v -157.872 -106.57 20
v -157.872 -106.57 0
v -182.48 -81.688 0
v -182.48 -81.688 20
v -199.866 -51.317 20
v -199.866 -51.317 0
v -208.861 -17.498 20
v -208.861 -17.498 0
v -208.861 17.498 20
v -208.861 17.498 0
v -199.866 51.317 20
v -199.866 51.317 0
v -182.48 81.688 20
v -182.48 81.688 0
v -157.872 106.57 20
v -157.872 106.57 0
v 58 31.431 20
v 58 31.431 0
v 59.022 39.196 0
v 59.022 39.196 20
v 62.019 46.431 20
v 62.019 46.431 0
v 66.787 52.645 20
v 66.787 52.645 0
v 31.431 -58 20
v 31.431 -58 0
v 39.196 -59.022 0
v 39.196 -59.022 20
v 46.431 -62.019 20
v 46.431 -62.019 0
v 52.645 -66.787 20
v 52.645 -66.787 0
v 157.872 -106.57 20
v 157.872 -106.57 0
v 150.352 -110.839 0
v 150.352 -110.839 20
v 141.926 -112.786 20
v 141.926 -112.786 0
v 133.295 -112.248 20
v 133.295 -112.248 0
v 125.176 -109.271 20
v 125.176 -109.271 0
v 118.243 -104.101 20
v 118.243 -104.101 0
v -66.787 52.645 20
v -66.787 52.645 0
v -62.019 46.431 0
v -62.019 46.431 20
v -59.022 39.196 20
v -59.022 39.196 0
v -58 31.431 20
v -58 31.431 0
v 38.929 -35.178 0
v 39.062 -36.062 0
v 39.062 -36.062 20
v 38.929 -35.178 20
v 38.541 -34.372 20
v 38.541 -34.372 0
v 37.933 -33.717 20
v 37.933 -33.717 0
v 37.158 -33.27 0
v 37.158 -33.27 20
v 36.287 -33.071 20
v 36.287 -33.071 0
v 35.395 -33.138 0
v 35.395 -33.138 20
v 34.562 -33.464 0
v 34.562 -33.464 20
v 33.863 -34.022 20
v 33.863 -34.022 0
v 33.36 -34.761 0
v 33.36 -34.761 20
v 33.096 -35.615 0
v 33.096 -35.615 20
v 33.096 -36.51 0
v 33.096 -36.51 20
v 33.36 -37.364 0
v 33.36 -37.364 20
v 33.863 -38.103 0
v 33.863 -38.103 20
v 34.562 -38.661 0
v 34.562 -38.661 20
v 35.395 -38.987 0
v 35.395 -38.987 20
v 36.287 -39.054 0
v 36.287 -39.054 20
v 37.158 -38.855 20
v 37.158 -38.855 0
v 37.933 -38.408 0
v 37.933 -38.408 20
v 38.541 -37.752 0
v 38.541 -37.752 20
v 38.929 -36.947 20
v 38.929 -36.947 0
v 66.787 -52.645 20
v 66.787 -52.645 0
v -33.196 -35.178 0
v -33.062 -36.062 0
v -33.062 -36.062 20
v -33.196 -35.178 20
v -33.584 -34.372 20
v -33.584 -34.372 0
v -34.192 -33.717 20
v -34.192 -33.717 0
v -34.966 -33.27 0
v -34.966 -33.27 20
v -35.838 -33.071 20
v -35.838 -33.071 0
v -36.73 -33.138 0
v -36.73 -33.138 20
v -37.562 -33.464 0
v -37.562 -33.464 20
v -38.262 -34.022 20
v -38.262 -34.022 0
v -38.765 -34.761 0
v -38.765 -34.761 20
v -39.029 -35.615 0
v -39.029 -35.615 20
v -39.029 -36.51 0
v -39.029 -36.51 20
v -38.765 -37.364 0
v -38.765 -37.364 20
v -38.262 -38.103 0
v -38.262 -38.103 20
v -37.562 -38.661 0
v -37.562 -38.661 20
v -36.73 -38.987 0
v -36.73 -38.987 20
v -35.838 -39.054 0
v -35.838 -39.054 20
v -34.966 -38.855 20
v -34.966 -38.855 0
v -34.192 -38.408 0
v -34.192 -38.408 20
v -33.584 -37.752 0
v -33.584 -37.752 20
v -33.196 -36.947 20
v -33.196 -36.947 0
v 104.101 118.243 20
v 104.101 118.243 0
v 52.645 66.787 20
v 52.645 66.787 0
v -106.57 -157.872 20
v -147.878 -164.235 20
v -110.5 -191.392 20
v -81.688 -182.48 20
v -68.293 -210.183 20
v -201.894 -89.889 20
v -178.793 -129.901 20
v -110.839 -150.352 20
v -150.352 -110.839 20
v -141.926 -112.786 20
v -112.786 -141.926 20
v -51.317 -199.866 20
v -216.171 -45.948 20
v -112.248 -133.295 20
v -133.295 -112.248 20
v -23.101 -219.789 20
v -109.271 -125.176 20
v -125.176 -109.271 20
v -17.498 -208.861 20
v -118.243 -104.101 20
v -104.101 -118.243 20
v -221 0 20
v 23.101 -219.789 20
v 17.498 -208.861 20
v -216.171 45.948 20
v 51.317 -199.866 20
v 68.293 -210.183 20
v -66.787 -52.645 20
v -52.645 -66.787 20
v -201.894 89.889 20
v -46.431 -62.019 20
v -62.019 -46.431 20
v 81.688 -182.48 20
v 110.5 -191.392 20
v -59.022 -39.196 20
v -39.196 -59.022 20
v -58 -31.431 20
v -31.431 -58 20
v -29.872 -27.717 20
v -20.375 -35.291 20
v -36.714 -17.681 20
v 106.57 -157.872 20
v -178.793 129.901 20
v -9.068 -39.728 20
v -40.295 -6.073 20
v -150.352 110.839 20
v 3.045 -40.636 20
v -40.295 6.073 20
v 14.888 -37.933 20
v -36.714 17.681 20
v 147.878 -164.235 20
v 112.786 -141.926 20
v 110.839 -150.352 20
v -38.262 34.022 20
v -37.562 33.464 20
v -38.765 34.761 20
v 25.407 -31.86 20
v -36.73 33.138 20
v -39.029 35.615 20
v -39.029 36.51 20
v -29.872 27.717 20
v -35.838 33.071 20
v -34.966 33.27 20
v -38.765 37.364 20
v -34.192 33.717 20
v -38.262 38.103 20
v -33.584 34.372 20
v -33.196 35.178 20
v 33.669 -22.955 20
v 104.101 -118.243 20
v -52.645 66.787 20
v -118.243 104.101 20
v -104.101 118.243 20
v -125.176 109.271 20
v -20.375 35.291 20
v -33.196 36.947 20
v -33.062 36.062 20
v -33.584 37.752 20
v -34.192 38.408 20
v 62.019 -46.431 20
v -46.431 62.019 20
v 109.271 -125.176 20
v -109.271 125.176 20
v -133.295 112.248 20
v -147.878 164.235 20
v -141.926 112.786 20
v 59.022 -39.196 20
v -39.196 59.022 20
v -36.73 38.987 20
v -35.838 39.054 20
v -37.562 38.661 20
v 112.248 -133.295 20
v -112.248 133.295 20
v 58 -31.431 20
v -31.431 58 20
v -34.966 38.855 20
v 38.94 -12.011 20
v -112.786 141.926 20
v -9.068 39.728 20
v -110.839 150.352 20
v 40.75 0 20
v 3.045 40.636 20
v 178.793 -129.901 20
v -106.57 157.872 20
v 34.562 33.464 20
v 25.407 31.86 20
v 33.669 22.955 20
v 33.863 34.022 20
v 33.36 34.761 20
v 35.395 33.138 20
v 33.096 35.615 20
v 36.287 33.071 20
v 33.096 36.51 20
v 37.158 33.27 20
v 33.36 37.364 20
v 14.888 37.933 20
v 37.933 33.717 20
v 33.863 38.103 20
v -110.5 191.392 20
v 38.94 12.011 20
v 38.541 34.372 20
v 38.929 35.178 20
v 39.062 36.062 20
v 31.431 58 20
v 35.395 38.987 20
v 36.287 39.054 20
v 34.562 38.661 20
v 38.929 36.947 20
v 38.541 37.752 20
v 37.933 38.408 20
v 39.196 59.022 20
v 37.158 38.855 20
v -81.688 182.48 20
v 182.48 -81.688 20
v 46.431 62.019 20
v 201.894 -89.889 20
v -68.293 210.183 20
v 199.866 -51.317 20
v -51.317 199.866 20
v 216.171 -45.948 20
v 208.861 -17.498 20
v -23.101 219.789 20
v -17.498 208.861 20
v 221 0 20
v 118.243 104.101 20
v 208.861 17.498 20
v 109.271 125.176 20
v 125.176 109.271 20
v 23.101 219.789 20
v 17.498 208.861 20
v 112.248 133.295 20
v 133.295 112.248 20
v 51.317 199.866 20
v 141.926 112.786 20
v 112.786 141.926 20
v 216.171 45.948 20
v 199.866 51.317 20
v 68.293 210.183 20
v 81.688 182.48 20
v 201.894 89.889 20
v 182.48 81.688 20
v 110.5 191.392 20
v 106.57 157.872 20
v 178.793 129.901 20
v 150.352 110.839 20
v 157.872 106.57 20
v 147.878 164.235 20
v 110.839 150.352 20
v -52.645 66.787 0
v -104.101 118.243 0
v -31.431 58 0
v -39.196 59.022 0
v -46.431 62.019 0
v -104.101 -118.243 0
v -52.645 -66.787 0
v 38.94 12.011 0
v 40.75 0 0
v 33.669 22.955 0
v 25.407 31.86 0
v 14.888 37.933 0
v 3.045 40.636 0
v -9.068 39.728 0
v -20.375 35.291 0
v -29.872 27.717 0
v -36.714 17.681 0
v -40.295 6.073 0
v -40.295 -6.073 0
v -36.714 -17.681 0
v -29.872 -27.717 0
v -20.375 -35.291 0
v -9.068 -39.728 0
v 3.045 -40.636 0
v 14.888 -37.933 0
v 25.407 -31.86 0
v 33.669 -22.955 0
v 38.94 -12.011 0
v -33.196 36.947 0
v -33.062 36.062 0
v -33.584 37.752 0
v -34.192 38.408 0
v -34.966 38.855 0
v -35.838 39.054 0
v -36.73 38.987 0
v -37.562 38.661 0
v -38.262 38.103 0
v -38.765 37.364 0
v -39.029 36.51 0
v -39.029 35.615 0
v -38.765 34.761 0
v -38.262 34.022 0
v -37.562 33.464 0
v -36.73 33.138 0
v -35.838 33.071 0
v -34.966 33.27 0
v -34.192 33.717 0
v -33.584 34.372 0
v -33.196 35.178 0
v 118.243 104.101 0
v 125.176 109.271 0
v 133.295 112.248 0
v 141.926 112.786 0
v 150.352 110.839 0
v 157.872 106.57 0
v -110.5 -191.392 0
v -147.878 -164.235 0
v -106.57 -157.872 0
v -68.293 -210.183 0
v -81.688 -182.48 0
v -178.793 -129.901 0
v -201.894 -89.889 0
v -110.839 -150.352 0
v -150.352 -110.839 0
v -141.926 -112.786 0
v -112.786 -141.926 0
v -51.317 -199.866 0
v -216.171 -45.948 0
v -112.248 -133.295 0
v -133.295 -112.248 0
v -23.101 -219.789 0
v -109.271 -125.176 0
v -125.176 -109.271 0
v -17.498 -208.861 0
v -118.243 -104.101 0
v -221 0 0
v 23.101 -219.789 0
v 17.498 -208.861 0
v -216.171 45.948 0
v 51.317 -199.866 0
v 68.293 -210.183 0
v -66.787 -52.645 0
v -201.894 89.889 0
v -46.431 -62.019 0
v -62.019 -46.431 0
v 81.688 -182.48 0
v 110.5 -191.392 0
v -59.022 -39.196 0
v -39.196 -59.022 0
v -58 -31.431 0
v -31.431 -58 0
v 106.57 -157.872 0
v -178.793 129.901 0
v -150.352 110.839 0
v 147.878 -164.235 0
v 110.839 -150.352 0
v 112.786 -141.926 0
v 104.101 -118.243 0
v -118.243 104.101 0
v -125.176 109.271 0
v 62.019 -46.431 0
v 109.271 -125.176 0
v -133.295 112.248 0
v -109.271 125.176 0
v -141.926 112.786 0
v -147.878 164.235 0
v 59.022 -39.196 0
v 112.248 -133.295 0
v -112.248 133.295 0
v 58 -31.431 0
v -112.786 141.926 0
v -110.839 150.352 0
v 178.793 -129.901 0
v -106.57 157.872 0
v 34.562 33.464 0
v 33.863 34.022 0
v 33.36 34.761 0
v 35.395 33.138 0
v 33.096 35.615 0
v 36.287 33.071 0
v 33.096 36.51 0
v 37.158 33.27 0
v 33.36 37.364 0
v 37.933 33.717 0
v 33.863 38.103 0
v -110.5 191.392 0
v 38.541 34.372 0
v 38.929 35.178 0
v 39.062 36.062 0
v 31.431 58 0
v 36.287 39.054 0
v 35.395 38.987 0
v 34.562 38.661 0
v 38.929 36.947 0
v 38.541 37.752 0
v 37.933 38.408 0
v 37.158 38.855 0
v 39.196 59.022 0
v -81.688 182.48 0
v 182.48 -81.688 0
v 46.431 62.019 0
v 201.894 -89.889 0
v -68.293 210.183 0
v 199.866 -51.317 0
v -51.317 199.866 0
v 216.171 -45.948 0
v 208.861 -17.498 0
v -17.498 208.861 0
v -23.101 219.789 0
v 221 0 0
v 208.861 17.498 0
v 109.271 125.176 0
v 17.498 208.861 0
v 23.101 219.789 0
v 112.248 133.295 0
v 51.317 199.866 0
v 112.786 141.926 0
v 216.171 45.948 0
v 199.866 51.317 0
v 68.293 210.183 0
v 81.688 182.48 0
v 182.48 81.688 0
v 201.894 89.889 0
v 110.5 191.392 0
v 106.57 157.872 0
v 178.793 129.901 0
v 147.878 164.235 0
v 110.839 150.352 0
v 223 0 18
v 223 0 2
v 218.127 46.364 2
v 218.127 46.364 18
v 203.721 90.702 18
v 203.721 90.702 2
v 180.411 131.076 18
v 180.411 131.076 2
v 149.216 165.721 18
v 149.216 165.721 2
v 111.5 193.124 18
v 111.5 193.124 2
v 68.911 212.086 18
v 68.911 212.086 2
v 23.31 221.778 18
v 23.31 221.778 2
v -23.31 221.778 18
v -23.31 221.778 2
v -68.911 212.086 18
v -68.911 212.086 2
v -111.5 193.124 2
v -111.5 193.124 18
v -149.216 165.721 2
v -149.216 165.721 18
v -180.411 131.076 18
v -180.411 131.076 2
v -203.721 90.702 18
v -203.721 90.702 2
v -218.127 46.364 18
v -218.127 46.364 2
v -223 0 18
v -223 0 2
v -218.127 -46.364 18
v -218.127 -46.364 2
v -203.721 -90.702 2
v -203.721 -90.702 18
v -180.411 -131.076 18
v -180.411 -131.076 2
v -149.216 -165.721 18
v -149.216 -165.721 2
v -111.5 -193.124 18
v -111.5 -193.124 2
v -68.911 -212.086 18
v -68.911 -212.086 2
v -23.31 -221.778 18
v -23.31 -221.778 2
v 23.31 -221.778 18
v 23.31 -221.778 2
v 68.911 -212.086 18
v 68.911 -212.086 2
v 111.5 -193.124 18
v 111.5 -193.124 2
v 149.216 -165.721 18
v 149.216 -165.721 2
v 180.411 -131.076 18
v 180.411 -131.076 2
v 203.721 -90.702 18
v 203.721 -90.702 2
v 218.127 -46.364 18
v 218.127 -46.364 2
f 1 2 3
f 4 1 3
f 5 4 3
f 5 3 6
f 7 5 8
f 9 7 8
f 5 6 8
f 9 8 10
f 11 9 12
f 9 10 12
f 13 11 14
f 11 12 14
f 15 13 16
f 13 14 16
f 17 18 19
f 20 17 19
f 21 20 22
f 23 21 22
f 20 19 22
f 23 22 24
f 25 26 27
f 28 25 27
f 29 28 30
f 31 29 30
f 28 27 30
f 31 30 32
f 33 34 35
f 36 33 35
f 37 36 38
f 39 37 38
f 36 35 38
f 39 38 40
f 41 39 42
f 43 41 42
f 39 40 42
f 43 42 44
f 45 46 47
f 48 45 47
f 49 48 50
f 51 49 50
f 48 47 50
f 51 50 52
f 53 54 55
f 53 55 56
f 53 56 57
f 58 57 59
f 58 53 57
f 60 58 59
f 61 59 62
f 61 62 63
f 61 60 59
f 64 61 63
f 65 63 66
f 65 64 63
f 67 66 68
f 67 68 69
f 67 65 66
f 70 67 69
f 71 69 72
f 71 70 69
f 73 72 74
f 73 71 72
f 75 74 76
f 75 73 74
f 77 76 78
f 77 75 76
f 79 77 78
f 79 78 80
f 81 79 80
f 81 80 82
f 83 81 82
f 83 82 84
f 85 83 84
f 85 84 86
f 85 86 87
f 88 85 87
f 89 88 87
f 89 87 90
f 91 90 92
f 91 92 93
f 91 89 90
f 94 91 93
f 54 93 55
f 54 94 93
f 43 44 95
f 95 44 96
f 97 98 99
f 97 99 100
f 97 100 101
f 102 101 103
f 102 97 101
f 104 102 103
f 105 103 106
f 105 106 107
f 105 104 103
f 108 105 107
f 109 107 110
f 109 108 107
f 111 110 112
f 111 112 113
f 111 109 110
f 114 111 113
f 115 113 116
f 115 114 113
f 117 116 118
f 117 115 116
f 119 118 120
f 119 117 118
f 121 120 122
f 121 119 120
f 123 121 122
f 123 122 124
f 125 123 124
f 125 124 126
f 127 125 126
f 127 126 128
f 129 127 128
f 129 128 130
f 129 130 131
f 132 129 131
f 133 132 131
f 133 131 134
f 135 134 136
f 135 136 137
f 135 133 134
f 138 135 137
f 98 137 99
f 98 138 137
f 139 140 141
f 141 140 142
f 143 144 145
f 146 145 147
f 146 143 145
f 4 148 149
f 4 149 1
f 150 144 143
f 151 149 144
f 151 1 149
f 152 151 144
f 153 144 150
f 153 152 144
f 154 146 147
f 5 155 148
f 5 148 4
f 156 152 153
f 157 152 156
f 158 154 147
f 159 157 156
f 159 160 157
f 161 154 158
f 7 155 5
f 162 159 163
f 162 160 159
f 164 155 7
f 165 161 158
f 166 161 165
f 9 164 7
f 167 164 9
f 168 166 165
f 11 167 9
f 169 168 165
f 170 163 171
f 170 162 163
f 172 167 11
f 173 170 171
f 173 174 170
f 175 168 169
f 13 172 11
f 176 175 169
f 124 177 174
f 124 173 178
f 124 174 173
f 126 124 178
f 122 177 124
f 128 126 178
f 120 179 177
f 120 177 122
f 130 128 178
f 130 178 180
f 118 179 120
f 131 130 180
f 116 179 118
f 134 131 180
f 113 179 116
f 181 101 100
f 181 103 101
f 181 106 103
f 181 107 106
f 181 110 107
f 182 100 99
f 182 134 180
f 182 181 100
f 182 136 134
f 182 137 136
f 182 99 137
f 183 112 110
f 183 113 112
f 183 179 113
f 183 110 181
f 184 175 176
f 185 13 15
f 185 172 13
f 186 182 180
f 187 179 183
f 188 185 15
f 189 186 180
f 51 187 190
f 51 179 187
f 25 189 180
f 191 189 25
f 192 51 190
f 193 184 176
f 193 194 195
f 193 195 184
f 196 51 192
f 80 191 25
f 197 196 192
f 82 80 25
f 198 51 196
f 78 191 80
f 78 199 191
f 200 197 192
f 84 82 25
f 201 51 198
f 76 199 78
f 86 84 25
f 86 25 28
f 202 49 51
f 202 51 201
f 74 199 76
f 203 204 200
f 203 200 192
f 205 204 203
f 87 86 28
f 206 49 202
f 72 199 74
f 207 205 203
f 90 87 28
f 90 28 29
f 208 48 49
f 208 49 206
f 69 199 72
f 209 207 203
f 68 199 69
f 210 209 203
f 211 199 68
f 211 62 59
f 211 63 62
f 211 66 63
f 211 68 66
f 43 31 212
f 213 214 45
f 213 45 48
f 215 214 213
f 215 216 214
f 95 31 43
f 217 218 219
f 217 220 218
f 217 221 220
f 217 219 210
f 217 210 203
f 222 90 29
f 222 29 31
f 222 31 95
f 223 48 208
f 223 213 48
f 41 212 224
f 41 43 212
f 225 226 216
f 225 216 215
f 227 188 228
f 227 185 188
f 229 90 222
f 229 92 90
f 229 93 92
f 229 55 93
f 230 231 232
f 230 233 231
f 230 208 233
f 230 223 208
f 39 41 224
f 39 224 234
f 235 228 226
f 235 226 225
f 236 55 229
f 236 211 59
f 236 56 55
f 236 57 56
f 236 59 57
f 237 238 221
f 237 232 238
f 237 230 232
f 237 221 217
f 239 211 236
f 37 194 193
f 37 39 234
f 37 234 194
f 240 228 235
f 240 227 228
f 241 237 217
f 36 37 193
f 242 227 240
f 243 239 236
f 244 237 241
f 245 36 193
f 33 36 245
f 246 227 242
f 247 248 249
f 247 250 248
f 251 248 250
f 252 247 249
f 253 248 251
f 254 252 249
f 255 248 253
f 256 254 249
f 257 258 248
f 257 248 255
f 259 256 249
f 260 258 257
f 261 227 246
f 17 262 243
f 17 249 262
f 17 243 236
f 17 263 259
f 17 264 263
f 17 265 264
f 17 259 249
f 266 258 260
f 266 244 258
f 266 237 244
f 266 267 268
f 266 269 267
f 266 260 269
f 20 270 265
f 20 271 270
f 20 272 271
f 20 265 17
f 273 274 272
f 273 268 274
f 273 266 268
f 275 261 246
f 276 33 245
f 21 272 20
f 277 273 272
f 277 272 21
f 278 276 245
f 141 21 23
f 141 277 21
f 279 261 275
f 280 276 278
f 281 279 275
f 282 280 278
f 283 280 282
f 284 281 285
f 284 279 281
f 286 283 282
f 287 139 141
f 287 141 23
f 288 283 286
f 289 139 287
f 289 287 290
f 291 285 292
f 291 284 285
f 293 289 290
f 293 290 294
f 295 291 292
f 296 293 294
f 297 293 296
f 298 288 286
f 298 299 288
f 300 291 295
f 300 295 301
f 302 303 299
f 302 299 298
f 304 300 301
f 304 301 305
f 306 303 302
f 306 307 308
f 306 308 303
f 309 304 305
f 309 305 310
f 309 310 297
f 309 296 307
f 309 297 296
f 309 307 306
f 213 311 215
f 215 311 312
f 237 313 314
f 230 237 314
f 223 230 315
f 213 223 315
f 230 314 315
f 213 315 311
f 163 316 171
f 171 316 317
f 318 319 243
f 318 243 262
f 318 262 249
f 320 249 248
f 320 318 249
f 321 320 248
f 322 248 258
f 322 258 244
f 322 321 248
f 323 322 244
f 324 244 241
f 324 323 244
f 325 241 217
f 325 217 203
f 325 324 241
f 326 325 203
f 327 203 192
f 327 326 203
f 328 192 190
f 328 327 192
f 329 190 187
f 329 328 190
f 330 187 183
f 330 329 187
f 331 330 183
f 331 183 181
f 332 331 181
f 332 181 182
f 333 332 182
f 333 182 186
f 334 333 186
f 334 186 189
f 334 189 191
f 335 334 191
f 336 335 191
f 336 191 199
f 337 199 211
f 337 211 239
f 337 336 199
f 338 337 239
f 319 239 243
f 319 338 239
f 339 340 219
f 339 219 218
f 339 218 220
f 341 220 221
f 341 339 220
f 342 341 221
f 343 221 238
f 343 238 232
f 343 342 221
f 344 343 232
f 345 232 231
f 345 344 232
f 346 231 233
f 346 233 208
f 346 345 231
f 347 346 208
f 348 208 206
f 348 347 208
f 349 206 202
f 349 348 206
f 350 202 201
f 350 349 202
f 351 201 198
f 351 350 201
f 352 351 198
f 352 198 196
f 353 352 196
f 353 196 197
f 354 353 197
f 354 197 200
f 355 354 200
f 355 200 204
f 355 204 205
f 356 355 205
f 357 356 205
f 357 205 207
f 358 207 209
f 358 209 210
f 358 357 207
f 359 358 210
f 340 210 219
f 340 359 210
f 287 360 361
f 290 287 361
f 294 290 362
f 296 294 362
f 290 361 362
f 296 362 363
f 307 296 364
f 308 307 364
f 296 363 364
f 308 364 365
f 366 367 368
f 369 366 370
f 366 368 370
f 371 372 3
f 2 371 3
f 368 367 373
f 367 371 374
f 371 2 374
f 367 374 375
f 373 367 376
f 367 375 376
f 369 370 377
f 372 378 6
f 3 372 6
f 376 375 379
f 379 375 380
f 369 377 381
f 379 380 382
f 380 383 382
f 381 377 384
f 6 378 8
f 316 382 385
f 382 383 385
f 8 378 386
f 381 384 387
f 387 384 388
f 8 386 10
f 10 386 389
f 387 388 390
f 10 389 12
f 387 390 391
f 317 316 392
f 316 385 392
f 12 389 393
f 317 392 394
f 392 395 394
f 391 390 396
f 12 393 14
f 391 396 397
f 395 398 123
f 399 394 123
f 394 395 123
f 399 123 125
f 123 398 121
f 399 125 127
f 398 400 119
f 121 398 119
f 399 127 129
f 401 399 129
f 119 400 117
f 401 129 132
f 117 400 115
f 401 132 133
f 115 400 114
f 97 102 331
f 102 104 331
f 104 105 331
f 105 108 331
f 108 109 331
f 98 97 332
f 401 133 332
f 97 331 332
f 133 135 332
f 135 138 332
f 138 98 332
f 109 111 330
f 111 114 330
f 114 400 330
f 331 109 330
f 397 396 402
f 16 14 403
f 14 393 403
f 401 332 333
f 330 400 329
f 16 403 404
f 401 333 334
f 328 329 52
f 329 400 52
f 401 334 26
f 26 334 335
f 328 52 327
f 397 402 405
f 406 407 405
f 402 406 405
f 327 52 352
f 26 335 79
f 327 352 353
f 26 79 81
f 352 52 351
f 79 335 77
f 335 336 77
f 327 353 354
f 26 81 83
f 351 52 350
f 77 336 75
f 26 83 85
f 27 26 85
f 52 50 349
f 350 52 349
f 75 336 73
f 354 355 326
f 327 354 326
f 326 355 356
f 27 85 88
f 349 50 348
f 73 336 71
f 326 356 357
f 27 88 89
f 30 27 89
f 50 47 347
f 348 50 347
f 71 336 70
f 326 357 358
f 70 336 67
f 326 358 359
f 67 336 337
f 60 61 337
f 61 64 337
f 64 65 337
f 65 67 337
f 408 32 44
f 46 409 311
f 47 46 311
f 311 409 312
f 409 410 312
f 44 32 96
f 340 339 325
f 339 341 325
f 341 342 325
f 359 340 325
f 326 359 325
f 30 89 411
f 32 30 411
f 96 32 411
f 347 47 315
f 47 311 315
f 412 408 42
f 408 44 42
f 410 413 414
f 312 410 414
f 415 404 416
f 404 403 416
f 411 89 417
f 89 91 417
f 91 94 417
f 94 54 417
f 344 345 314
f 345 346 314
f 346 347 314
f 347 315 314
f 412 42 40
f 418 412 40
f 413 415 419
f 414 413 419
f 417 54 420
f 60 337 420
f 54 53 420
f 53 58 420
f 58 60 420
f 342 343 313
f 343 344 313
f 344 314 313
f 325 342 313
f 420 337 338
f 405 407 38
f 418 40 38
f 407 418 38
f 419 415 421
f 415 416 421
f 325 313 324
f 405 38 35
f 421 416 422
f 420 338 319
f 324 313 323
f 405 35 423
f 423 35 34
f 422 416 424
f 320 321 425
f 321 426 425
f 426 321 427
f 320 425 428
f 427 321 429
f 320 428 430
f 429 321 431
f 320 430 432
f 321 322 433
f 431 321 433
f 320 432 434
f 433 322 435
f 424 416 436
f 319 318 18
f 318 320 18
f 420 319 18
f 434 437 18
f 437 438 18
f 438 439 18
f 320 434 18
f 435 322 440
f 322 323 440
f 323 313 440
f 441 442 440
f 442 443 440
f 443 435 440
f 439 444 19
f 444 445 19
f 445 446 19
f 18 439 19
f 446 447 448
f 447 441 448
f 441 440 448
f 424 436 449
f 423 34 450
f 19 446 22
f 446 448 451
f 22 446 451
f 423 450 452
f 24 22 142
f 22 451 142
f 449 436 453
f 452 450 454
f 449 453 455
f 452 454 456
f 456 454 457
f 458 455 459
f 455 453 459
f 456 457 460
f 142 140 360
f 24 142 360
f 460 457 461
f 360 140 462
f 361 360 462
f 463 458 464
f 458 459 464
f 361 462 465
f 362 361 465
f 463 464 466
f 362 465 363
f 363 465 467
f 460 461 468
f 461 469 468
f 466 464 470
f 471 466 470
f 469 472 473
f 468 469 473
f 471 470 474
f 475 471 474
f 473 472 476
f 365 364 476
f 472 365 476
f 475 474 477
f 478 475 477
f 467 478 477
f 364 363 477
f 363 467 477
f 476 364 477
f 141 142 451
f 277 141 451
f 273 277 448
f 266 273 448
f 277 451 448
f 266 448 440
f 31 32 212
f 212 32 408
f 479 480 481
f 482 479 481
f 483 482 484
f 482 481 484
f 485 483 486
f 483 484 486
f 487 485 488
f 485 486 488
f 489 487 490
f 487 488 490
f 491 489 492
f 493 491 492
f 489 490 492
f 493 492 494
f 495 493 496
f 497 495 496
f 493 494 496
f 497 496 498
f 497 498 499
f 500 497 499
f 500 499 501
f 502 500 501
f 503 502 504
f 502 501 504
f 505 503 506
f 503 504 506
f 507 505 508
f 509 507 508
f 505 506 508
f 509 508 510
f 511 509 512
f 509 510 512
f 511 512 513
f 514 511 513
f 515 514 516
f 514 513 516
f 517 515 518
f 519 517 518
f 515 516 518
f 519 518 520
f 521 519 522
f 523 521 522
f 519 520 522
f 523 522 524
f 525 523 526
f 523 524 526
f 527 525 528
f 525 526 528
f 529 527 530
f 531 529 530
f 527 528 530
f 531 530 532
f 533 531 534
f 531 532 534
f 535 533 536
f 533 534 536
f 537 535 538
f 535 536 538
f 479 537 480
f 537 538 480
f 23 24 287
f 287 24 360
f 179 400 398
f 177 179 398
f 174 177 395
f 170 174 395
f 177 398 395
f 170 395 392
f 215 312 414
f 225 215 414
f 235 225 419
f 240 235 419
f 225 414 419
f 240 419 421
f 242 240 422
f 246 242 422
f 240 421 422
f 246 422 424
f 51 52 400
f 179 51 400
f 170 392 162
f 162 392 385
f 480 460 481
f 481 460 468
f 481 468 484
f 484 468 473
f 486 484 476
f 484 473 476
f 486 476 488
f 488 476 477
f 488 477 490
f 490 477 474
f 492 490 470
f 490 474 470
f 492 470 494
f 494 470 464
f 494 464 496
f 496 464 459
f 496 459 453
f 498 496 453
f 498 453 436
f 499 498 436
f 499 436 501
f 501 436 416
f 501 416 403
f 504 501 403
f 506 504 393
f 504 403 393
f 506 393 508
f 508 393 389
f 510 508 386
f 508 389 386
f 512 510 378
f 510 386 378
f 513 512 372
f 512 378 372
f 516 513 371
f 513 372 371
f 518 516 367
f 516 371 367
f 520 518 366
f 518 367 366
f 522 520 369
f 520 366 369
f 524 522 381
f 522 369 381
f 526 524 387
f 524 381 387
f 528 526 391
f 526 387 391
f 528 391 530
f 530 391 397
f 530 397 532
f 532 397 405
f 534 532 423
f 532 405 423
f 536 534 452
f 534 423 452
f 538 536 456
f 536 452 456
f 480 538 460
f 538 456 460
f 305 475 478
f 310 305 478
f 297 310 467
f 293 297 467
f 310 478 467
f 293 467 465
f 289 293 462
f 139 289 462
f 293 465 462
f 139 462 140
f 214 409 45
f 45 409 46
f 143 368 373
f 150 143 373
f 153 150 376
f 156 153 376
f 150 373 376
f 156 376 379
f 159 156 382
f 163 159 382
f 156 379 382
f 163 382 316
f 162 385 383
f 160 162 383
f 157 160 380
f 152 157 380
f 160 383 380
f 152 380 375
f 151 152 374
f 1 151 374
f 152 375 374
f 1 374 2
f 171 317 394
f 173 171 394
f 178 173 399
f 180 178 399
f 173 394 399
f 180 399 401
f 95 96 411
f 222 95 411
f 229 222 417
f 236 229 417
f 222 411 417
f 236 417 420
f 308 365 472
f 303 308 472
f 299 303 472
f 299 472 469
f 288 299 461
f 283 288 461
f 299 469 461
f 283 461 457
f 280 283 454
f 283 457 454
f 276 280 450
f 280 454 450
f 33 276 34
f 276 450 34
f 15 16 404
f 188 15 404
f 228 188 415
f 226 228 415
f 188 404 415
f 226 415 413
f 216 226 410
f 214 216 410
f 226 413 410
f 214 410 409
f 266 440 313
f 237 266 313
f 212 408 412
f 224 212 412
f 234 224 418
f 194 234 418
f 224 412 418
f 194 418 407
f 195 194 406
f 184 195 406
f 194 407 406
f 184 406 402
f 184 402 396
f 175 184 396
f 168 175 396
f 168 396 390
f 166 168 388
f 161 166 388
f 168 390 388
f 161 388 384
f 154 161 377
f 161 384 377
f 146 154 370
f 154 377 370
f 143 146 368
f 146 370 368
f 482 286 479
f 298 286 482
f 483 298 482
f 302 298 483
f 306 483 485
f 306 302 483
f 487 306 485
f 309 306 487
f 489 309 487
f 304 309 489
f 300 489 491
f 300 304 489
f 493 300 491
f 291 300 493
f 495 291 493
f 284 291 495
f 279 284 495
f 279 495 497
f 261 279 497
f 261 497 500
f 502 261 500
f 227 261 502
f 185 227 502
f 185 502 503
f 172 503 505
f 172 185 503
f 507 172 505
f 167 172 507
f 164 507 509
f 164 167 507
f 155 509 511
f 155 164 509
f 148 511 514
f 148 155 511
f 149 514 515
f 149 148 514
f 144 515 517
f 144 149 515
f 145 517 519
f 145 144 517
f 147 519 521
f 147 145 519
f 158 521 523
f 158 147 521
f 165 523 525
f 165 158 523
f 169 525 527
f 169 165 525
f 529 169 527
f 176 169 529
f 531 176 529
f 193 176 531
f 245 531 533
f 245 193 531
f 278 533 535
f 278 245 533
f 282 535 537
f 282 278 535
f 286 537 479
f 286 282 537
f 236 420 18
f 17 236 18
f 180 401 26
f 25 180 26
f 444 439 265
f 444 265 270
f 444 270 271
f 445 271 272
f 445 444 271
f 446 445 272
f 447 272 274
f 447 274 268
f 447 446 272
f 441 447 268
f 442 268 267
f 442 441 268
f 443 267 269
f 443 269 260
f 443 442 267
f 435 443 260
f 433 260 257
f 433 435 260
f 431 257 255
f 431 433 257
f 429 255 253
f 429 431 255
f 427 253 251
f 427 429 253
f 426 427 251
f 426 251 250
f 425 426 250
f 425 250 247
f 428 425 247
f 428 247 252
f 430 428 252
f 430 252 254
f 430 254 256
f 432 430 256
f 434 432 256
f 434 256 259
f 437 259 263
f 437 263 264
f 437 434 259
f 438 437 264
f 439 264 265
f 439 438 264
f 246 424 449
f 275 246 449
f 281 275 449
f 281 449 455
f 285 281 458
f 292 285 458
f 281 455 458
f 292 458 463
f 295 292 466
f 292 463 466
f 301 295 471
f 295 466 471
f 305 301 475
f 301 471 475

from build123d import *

# Parameters (mm, degrees)
F0_R     = 223
F0_R_2   = 3
F0_R_3   = 40.75
F1_DEPTH = 20
F2_SIZE  = 2


with BuildPart() as f1:
    # F0 (on Top) → F1 (new body)
    with BuildSketch(Plane.XY):
        Circle(F0_R)
        with BuildLine():
            ThreePointArc((106.569996, -157.872408), (0, -210), (-106.569996, -157.872408))
            ThreePointArc((-106.569996, -157.872408), (-112.829719, -137.590849), (-104.100978, -118.243114))
            Line((-104.100978, -118.243114), (-52.644661, -66.786797))
            ThreePointArc((-52.644661, -66.786797), (-42.91196, -60.283614), (-31.431458, -58))
            Line((-31.431458, -58), (31.431458, -58))
            ThreePointArc((31.431458, -58), (42.91196, -60.283614), (52.644661, -66.786797))
            Line((52.644661, -66.786797), (104.100978, -118.243114))
            ThreePointArc((104.100978, -118.243114), (112.829719, -137.590849), (106.569996, -157.872408))
        make_face(mode=Mode.SUBTRACT)
        with Locations((-36.062446, -36.062446)):
            Circle(F0_R_2, mode=Mode.SUBTRACT)
        with Locations((36.062446, -36.062446)):
            Circle(F0_R_2, mode=Mode.SUBTRACT)
        with BuildLine():
            ThreePointArc((157.872408, 106.569996), (210, 0), (157.872408, -106.569996))
            ThreePointArc((157.872408, -106.569996), (137.590849, -112.829719), (118.243114, -104.100978))
            Line((118.243114, -104.100978), (66.786797, -52.644661))
            ThreePointArc((66.786797, -52.644661), (60.283614, -42.91196), (58, -31.431458))
            Line((58, -31.431458), (58, 31.431458))
            ThreePointArc((58, 31.431458), (60.283614, 42.91196), (66.786797, 52.644661))
            Line((66.786797, 52.644661), (118.243114, 104.100978))
            ThreePointArc((118.243114, 104.100978), (137.590849, 112.829719), (157.872408, 106.569996))
        make_face(mode=Mode.SUBTRACT)
        with BuildLine():
            ThreePointArc((-157.872408, -106.569996), (-210, 0), (-157.872408, 106.569996))
            ThreePointArc((-157.872408, 106.569996), (-137.590849, 112.829719), (-118.243114, 104.100978))
            Line((-118.243114, 104.100978), (-66.786797, 52.644661))
            ThreePointArc((-66.786797, 52.644661), (-60.283614, 42.91196), (-58, 31.431458))
            Line((-58, 31.431458), (-58, -31.431458))
            ThreePointArc((-58, -31.431458), (-60.283614, -42.91196), (-66.786797, -52.644661))
            Line((-66.786797, -52.644661), (-118.243114, -104.100978))
            ThreePointArc((-118.243114, -104.100978), (-137.590849, -112.829719), (-157.872408, -106.569996))
        make_face(mode=Mode.SUBTRACT)
        with Locations((-36.062446, 36.062446)):
            Circle(F0_R_2, mode=Mode.SUBTRACT)
        Circle(F0_R_3, mode=Mode.SUBTRACT)
        with Locations((36.062446, 36.062446)):
            Circle(F0_R_2, mode=Mode.SUBTRACT)
        with BuildLine():
            Line((31.431458, 58), (-31.431458, 58))
            ThreePointArc((-31.431458, 58), (-42.91196, 60.283614), (-52.644661, 66.786797))
            Line((-52.644661, 66.786797), (-104.100978, 118.243114))
            ThreePointArc((-104.100978, 118.243114), (-112.829719, 137.590849), (-106.569996, 157.872408))
            ThreePointArc((-106.569996, 157.872408), (0, 210), (106.569996, 157.872408))
            ThreePointArc((106.569996, 157.872408), (112.829719, 137.590849), (104.100978, 118.243114))
            Line((104.100978, 118.243114), (52.644661, 66.786797))
            ThreePointArc((52.644661, 66.786797), (42.91196, 60.283614), (31.431458, 58))
        make_face(mode=Mode.SUBTRACT)
    extrude(amount=F1_DEPTH)

    # F2
    f2_edges = [f1.edges().sort_by_distance(p)[0] for p in [
        (-223, 0, 0),
        (-223, 0, 20),
    ]]
    chamfer(f2_edges, length=F2_SIZE)


solid = f1.part
